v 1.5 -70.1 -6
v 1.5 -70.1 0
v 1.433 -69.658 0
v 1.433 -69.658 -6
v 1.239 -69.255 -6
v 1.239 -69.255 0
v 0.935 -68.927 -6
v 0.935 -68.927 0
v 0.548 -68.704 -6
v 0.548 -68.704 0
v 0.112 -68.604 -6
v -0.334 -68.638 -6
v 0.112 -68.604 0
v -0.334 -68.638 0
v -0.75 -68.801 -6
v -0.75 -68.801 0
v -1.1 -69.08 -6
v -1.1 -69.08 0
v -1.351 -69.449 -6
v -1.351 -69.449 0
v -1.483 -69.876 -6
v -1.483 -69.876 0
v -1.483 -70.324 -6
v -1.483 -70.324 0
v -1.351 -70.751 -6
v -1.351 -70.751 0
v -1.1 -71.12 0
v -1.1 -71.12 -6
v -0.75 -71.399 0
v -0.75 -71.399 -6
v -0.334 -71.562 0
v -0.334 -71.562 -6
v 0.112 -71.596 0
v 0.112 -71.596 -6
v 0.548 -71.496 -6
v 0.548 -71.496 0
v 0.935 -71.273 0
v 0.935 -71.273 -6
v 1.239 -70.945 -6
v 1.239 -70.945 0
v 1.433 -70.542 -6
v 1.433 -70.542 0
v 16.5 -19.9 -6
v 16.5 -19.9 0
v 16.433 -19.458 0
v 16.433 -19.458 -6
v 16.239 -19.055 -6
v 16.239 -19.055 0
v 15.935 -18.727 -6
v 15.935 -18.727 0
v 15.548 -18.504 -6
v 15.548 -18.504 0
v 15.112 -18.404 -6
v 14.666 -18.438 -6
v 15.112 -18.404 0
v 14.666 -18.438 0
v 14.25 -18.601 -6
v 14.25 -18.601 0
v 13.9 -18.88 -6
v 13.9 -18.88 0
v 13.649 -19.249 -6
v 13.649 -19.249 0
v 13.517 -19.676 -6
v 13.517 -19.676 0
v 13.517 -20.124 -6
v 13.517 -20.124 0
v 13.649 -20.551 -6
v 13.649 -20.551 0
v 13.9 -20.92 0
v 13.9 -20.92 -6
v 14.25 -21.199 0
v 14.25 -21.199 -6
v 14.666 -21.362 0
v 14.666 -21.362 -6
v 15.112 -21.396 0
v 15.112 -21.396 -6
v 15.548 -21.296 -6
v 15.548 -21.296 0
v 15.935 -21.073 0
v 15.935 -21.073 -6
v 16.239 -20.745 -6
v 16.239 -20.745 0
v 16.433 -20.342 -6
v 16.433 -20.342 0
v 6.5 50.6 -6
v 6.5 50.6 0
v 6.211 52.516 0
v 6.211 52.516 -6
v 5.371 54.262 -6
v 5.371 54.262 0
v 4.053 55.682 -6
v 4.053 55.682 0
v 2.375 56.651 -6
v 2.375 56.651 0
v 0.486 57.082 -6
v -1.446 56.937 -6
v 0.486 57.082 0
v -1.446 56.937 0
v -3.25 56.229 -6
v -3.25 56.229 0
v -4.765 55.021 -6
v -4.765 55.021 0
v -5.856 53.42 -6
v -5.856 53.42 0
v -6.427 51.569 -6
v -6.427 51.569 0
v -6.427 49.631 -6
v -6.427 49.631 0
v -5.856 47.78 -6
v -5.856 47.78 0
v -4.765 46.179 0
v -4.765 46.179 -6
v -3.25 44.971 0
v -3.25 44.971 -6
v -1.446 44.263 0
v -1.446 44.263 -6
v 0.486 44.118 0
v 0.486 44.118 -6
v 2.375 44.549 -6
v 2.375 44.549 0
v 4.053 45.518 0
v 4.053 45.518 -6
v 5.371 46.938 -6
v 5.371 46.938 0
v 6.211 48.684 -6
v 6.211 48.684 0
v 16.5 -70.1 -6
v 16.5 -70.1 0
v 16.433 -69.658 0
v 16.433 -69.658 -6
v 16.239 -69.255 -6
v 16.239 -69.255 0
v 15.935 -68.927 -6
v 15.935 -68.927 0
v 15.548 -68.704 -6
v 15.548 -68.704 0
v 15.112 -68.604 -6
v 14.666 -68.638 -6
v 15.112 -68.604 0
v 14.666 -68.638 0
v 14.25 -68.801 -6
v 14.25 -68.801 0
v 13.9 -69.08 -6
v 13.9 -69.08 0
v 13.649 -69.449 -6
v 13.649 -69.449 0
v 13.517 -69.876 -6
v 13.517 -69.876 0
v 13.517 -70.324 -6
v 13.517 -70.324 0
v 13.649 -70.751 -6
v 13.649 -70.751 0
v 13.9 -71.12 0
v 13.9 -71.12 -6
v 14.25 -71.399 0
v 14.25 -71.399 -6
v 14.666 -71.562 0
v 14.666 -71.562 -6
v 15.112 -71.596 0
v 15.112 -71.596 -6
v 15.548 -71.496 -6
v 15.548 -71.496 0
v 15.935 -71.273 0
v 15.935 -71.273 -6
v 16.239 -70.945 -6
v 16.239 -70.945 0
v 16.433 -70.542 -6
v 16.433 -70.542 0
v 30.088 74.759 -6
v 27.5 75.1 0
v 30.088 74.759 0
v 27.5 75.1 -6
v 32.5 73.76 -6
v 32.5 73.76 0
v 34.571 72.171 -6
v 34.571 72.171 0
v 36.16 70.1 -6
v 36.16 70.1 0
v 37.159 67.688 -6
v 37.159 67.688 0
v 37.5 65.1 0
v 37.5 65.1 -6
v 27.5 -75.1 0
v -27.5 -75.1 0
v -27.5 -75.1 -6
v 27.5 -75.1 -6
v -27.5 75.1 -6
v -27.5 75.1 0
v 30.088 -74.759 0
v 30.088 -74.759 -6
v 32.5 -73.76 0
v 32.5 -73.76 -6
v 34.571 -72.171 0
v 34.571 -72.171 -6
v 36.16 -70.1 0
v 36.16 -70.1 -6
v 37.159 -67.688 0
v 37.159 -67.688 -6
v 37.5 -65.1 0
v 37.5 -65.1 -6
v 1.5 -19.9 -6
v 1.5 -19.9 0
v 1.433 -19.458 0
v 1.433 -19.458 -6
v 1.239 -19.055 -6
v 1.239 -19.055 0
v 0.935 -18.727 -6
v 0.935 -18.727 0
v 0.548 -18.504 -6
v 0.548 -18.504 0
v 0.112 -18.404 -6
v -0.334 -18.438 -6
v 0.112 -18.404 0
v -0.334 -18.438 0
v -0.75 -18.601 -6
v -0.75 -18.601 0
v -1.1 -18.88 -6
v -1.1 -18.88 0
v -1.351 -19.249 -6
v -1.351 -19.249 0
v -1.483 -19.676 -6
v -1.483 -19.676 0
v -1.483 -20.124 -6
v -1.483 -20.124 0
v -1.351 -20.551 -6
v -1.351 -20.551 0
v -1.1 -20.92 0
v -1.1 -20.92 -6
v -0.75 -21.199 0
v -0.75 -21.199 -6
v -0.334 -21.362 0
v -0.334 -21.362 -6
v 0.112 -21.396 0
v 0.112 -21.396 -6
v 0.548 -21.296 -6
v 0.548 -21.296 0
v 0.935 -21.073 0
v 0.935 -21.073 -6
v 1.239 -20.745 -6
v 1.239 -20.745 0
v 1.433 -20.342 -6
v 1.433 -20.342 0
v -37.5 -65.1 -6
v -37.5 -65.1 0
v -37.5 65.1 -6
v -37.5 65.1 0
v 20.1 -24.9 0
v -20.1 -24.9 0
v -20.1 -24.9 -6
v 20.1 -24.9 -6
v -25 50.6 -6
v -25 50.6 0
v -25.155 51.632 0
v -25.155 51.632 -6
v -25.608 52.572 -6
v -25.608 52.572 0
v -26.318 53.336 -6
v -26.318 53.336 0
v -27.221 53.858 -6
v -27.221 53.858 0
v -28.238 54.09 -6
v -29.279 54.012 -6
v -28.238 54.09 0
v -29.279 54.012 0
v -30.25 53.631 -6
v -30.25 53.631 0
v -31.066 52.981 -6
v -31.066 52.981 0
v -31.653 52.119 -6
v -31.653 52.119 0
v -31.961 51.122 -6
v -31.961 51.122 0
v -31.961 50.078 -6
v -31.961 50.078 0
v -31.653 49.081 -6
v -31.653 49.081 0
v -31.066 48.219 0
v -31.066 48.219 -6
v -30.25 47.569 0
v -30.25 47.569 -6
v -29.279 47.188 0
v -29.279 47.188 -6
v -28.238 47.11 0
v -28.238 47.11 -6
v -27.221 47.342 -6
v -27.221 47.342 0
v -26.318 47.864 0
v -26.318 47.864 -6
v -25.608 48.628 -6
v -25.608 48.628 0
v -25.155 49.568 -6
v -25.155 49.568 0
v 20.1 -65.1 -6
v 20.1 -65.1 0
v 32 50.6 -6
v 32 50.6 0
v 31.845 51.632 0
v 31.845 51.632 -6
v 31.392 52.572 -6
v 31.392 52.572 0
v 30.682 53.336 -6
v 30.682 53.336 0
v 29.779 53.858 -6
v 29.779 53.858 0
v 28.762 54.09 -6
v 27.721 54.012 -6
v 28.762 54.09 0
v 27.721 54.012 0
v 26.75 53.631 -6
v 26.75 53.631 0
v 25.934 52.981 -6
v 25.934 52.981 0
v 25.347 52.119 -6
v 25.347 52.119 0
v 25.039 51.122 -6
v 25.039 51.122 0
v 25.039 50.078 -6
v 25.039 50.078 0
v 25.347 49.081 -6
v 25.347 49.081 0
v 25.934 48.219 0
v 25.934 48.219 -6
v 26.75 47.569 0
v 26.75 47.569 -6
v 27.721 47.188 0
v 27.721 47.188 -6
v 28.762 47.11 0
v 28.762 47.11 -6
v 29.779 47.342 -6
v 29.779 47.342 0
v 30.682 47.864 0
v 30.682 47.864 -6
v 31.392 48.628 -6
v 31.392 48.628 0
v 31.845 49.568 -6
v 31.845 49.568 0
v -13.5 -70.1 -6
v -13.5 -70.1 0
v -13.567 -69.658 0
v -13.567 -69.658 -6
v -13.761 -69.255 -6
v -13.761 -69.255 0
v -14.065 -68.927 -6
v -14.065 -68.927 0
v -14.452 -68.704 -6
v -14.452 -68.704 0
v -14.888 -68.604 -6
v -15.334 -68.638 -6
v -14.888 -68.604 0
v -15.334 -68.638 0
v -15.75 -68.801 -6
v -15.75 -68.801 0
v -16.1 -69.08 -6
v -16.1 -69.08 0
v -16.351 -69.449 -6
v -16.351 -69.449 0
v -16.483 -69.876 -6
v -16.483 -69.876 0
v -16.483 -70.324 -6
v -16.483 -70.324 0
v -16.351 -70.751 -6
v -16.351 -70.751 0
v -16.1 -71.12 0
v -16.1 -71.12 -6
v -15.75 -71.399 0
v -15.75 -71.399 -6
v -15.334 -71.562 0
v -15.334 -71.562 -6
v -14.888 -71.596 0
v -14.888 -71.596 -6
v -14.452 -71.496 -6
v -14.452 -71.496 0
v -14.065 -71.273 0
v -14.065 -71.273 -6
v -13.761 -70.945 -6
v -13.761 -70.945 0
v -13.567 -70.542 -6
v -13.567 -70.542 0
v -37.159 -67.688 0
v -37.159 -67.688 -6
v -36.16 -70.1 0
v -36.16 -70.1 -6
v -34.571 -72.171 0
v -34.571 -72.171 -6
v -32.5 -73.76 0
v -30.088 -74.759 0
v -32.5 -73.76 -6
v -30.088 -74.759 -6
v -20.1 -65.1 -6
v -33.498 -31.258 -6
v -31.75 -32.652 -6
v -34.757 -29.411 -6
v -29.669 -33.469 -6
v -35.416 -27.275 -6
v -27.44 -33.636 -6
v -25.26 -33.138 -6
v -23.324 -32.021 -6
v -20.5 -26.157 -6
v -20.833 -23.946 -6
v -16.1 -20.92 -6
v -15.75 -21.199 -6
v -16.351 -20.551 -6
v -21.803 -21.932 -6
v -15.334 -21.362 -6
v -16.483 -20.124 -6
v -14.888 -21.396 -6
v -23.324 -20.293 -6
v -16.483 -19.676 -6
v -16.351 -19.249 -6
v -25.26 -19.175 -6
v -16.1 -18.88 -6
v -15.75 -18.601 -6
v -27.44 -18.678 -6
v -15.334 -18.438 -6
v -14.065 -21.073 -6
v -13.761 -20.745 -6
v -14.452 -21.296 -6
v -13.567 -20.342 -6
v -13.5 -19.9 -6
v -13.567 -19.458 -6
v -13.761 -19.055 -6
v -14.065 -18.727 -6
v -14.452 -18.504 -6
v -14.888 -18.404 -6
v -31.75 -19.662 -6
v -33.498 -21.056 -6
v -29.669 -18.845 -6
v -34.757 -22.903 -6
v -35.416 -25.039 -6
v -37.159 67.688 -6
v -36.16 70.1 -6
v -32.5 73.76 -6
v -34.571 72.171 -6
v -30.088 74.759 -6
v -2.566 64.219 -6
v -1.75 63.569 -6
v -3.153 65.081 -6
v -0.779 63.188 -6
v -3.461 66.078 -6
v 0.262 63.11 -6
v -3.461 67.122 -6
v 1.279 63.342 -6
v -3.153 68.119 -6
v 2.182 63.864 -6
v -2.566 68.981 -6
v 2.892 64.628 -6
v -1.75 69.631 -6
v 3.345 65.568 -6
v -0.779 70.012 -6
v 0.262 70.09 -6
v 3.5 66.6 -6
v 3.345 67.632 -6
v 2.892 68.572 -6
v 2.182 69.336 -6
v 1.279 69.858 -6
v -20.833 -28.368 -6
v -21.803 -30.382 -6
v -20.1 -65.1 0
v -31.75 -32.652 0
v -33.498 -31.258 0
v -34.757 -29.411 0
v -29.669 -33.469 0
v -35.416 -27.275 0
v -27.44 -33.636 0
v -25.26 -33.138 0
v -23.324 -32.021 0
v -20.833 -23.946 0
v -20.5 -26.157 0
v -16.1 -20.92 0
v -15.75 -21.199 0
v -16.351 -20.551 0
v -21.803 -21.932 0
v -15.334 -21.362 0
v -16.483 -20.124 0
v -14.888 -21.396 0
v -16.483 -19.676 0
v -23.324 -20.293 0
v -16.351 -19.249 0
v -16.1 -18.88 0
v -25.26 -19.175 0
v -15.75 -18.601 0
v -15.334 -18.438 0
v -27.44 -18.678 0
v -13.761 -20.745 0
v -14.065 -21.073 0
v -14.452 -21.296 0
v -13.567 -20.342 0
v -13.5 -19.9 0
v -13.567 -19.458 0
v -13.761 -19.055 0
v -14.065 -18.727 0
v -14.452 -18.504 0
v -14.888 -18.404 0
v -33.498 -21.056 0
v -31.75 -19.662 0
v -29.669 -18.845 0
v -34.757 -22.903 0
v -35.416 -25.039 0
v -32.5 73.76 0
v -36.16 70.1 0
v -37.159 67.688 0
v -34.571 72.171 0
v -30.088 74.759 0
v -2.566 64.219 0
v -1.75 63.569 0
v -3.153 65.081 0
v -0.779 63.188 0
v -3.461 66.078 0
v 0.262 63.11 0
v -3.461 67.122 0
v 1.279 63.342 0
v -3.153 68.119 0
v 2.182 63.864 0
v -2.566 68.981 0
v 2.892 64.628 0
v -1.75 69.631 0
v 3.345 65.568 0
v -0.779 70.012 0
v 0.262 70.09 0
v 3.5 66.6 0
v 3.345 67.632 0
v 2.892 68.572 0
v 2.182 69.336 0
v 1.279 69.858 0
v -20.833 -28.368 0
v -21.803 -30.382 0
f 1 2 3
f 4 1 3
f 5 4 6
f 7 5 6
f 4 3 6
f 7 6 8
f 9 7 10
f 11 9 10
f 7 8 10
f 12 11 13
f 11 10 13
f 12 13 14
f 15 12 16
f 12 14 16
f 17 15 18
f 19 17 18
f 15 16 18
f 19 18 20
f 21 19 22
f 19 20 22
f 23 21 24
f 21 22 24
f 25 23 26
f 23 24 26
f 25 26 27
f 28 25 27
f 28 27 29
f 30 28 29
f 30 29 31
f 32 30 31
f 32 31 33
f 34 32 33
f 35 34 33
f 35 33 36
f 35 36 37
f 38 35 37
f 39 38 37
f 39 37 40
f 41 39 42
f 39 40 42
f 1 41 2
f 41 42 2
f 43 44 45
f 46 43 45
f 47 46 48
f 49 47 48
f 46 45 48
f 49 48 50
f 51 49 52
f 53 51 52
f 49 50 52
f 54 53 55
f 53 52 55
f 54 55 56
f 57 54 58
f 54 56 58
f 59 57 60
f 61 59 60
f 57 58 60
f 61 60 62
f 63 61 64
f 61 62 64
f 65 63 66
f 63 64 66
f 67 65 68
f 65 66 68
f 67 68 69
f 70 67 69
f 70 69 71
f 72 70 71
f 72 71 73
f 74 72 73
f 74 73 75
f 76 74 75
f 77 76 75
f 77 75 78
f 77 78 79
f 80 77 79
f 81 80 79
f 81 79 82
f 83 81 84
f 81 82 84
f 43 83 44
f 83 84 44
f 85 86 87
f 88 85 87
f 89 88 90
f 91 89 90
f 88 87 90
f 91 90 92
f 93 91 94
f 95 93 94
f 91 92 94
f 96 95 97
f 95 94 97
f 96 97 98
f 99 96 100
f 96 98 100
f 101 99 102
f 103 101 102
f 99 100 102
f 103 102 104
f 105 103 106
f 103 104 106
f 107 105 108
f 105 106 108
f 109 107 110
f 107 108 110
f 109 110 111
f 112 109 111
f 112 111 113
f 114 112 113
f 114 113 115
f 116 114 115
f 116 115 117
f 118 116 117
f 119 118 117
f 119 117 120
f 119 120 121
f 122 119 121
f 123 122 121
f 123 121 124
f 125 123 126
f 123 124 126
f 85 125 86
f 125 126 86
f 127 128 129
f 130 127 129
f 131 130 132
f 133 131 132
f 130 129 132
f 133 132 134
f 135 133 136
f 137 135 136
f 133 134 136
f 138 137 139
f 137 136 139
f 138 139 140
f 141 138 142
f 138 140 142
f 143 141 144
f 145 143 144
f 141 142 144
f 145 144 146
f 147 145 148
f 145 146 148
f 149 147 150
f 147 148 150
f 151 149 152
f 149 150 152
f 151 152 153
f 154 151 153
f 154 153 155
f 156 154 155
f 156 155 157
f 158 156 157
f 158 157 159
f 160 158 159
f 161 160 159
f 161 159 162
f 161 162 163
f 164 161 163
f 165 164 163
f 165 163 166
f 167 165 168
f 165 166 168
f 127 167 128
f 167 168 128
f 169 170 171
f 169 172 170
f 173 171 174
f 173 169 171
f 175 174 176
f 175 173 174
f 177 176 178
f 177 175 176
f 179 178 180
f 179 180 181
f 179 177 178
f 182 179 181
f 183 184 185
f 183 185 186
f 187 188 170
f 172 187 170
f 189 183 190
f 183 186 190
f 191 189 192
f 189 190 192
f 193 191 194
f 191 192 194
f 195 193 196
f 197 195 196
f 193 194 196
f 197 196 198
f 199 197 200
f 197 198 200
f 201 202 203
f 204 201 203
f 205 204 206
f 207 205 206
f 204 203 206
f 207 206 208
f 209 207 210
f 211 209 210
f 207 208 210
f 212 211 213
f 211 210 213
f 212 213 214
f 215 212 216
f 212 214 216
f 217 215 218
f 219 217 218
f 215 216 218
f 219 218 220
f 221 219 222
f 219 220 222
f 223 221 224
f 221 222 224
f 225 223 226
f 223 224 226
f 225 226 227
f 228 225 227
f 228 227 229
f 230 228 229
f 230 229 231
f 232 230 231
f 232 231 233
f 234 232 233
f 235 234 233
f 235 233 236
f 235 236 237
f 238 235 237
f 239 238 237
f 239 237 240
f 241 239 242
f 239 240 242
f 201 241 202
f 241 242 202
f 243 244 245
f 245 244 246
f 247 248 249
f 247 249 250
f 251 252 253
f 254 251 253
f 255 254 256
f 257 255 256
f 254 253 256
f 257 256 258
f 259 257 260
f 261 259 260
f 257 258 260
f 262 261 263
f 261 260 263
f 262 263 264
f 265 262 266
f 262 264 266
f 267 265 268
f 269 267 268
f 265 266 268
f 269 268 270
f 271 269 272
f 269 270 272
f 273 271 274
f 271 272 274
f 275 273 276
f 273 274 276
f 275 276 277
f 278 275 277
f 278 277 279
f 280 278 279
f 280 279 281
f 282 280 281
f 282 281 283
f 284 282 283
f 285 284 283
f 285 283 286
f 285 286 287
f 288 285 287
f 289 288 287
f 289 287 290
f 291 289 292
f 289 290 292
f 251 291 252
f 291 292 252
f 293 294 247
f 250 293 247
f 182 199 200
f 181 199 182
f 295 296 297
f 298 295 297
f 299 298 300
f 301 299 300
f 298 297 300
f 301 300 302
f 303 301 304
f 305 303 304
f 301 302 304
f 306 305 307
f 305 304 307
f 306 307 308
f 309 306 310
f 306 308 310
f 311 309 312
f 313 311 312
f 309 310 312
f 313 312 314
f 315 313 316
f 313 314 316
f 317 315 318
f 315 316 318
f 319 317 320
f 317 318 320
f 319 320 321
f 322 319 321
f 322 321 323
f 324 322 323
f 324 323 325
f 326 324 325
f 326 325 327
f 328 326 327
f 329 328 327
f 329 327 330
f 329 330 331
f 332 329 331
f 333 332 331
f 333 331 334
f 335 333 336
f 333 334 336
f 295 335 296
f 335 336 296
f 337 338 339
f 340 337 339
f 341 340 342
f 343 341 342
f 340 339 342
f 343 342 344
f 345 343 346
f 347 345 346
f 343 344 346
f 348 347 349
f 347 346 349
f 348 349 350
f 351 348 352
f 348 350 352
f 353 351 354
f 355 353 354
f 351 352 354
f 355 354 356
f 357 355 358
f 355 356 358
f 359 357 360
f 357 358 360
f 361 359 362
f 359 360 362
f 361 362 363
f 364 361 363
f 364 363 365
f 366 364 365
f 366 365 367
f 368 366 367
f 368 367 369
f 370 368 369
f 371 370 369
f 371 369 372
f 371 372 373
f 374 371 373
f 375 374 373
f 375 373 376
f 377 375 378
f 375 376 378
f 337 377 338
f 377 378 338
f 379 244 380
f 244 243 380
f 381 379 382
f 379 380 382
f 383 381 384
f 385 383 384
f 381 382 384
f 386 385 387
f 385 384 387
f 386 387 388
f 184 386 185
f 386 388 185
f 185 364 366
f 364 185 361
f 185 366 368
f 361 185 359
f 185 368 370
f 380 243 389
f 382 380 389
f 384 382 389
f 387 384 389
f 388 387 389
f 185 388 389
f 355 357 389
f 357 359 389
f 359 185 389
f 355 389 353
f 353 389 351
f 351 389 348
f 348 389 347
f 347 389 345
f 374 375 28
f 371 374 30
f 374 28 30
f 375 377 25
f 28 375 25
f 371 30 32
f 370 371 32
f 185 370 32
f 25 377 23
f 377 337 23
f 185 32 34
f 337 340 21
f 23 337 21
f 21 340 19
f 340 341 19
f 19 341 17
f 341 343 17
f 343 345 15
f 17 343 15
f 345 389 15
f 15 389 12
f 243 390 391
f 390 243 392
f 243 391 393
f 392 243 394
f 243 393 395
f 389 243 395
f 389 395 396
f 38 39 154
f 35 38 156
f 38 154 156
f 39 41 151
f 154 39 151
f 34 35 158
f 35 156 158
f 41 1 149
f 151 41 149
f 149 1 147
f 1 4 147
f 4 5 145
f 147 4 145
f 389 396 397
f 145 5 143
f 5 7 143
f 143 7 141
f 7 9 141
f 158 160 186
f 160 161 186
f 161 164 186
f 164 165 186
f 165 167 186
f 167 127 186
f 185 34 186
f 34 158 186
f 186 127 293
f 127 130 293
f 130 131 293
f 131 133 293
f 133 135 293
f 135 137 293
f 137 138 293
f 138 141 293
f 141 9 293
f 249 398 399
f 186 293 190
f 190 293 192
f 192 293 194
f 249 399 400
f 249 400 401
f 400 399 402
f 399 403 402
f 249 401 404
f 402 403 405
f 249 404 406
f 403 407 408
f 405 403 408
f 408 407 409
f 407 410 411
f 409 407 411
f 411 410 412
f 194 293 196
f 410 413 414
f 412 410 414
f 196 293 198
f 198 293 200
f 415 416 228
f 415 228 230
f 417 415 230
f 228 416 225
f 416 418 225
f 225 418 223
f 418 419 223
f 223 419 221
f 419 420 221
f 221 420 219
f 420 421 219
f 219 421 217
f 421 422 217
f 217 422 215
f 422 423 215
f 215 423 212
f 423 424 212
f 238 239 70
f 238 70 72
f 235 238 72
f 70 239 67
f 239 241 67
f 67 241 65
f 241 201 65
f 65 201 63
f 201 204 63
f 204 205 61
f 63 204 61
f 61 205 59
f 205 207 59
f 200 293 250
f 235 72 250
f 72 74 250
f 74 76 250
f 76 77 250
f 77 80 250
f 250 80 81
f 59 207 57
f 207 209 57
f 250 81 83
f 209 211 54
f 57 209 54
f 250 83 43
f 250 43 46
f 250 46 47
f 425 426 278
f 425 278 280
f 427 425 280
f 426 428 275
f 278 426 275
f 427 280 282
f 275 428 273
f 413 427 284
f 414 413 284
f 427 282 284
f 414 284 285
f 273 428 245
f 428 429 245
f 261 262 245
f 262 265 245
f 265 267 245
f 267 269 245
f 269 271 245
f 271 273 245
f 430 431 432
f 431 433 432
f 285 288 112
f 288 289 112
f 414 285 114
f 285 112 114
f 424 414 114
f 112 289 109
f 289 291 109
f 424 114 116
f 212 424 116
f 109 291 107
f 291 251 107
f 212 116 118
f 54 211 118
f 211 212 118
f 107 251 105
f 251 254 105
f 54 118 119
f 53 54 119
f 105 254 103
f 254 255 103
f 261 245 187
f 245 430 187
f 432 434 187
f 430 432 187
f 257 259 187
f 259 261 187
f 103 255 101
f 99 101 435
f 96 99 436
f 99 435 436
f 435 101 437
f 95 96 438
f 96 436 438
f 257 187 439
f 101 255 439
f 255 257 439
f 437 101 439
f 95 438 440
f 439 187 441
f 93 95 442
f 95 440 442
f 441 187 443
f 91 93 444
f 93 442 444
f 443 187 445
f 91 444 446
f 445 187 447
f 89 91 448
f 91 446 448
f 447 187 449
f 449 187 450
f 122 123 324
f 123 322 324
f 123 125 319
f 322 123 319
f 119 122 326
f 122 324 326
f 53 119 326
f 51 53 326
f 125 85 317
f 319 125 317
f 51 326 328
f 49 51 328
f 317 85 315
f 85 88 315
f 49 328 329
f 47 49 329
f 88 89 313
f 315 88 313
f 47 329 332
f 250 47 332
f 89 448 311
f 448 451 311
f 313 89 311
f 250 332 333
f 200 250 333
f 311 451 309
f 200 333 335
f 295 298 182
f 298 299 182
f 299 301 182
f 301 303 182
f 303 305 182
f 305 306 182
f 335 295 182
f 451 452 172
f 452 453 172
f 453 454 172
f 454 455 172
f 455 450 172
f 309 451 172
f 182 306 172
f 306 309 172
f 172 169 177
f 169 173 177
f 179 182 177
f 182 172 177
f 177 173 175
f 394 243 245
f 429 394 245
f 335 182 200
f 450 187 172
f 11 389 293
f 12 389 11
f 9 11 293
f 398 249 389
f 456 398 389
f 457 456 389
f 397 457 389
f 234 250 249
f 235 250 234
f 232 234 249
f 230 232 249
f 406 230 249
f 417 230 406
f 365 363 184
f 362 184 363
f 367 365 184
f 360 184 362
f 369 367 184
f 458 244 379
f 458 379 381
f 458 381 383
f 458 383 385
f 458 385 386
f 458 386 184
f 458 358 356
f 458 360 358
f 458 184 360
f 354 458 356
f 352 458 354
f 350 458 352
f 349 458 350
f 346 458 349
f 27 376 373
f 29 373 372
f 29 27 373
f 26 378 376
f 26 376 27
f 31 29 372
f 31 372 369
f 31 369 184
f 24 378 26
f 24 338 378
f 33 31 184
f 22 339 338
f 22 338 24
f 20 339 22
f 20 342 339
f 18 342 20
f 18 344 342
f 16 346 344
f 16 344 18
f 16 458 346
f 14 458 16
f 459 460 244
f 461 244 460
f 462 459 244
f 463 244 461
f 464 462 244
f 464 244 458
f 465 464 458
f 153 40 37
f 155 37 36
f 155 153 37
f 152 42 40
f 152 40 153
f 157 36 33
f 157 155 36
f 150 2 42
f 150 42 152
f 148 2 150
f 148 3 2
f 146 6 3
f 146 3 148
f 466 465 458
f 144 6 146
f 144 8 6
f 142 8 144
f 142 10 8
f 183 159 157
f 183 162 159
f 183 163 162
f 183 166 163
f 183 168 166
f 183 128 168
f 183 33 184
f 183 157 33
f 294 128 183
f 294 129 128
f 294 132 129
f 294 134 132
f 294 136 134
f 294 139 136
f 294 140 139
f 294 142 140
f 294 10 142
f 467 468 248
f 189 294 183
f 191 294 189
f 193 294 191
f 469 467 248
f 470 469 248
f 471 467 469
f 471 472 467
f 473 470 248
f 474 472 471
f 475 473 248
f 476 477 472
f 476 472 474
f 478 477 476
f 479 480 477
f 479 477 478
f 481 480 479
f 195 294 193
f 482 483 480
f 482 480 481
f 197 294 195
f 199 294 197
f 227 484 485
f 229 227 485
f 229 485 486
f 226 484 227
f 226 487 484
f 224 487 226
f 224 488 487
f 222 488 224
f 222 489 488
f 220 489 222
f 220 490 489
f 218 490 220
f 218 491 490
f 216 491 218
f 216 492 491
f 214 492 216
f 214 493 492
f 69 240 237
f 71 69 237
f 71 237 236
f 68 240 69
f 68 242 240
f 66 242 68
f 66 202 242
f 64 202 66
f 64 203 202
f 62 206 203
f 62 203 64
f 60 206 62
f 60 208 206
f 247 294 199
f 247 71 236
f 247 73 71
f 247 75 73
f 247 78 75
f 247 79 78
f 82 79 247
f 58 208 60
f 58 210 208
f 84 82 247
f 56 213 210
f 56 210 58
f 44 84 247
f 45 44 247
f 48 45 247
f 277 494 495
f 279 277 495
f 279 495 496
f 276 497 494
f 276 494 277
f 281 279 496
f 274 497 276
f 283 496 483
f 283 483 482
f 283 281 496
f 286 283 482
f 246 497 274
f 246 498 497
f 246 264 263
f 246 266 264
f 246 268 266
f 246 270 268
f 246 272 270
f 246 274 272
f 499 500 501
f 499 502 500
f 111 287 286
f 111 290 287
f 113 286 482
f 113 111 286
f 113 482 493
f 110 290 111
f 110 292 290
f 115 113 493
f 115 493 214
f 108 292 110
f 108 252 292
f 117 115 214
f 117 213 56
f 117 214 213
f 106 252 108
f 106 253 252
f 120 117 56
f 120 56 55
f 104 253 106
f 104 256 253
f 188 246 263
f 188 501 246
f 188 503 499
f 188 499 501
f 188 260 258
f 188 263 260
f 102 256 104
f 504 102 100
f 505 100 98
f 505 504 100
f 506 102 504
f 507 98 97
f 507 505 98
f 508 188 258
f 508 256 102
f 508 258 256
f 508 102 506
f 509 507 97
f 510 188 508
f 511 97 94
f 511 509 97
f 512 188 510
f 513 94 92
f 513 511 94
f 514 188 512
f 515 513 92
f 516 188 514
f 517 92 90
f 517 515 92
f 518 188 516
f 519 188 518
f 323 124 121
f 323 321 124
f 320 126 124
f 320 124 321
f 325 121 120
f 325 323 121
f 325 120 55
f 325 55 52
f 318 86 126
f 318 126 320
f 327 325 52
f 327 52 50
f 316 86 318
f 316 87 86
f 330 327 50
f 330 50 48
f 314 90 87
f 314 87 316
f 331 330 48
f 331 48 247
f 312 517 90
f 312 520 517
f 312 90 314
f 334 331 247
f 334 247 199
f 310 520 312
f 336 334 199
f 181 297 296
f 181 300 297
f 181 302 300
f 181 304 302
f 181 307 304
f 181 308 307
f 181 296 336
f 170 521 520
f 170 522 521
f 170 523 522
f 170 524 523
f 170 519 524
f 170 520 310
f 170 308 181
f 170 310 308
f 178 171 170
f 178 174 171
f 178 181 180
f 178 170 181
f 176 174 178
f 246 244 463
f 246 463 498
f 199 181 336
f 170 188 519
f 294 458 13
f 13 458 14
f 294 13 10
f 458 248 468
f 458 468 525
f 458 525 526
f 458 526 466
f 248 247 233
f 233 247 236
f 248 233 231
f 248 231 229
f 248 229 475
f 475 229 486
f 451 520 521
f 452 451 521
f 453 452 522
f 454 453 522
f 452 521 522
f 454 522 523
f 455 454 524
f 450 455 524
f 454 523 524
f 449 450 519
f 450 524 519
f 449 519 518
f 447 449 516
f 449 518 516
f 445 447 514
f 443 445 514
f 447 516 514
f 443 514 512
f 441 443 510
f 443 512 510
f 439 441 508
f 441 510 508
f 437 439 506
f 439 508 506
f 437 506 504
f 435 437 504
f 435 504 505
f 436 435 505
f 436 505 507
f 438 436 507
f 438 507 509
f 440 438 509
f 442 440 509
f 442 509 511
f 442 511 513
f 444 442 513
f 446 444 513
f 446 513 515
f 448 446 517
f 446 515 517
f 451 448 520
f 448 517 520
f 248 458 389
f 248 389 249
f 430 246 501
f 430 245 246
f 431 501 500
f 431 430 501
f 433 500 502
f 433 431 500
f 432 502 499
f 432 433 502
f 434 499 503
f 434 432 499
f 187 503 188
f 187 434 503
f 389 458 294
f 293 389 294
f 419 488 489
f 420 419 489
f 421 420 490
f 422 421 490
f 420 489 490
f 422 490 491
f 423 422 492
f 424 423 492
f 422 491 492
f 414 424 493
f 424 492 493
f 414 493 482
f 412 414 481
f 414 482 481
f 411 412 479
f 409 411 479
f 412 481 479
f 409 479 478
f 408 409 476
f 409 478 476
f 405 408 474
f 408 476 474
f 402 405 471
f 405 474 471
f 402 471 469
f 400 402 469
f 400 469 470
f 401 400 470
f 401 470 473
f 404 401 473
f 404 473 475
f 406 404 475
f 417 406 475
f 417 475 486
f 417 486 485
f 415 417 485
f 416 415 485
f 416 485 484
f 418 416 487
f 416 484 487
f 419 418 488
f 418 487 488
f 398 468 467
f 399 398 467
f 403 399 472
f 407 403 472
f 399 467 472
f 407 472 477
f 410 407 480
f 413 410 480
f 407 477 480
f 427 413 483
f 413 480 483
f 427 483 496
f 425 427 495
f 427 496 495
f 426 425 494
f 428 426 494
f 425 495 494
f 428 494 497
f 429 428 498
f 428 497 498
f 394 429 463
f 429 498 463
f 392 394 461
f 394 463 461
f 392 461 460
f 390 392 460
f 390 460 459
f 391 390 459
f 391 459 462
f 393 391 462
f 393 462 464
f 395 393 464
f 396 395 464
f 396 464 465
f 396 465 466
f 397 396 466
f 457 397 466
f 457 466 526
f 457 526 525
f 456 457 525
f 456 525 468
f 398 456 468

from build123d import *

# Parameters (mm, degrees)
CROQUIS2_W              = 75
CROQUIS2_H              = 150.2
CROQUIS2_R              = 3.5
CROQUIS2_R_2            = 1.5
CROQUIS2_R_3            = 6.5
CROQUIS2_W_2            = 40.2
CROQUIS2_H_2            = 40.2
SALIENTE_EXTRUIR1_DEPTH = 6
CROQUIS3_R              = 7.5
CORTAR_EXTRUIR1_DEPTH   = 13
REDONDEO1_R             = 10


with BuildPart() as part:
    # Croquis2 → Saliente-Extruir1 (new body)
    with BuildSketch(Plane.XY):
        Rectangle(CROQUIS2_W, CROQUIS2_H)
        with Locations((-28.5, 50.6)):
            Circle(CROQUIS2_R, mode=Mode.SUBTRACT)
        with Locations((28.5, 50.6)):
            Circle(CROQUIS2_R, mode=Mode.SUBTRACT)
        with Locations((0, 66.6)):
            Circle(CROQUIS2_R, mode=Mode.SUBTRACT)
        with Locations((0, -19.9)):
            Circle(CROQUIS2_R_2, mode=Mode.SUBTRACT)
        with Locations((-15, -19.9)):
            Circle(CROQUIS2_R_2, mode=Mode.SUBTRACT)
        with Locations((15, -19.9)):
            Circle(CROQUIS2_R_2, mode=Mode.SUBTRACT)
        with Locations((-15, -70.1)):
            Circle(CROQUIS2_R_2, mode=Mode.SUBTRACT)
        with Locations((0, -70.1)):
            Circle(CROQUIS2_R_2, mode=Mode.SUBTRACT)
        with Locations((15, -70.1)):
            Circle(CROQUIS2_R_2, mode=Mode.SUBTRACT)
        with Locations((0, 50.6)):
            Circle(CROQUIS2_R_3, mode=Mode.SUBTRACT)
        with Locations((0, -45)):
            Rectangle(CROQUIS2_W_2, CROQUIS2_H_2, mode=Mode.SUBTRACT)
    extrude(amount=-SALIENTE_EXTRUIR1_DEPTH)

    # Croquis3 → Cortar-Extruir1 (cut)
    with BuildSketch(Plane.XY):
        with Locations((-28, -26.156897814)):
            Circle(CROQUIS3_R)
    extrude(amount=-CORTAR_EXTRUIR1_DEPTH, mode=Mode.SUBTRACT)

    # Redondeo1
    redondeo1_edges = [part.edges().sort_by_distance(p)[0] for p in [
        (37.5, -75.1, -3),
        (-37.5, -75.1, -3),
        (-37.5, 75.1, -3),
        (37.5, 75.1, -3),
    ]]
    fillet(redondeo1_edges, radius=REDONDEO1_R)


solid = part.part
